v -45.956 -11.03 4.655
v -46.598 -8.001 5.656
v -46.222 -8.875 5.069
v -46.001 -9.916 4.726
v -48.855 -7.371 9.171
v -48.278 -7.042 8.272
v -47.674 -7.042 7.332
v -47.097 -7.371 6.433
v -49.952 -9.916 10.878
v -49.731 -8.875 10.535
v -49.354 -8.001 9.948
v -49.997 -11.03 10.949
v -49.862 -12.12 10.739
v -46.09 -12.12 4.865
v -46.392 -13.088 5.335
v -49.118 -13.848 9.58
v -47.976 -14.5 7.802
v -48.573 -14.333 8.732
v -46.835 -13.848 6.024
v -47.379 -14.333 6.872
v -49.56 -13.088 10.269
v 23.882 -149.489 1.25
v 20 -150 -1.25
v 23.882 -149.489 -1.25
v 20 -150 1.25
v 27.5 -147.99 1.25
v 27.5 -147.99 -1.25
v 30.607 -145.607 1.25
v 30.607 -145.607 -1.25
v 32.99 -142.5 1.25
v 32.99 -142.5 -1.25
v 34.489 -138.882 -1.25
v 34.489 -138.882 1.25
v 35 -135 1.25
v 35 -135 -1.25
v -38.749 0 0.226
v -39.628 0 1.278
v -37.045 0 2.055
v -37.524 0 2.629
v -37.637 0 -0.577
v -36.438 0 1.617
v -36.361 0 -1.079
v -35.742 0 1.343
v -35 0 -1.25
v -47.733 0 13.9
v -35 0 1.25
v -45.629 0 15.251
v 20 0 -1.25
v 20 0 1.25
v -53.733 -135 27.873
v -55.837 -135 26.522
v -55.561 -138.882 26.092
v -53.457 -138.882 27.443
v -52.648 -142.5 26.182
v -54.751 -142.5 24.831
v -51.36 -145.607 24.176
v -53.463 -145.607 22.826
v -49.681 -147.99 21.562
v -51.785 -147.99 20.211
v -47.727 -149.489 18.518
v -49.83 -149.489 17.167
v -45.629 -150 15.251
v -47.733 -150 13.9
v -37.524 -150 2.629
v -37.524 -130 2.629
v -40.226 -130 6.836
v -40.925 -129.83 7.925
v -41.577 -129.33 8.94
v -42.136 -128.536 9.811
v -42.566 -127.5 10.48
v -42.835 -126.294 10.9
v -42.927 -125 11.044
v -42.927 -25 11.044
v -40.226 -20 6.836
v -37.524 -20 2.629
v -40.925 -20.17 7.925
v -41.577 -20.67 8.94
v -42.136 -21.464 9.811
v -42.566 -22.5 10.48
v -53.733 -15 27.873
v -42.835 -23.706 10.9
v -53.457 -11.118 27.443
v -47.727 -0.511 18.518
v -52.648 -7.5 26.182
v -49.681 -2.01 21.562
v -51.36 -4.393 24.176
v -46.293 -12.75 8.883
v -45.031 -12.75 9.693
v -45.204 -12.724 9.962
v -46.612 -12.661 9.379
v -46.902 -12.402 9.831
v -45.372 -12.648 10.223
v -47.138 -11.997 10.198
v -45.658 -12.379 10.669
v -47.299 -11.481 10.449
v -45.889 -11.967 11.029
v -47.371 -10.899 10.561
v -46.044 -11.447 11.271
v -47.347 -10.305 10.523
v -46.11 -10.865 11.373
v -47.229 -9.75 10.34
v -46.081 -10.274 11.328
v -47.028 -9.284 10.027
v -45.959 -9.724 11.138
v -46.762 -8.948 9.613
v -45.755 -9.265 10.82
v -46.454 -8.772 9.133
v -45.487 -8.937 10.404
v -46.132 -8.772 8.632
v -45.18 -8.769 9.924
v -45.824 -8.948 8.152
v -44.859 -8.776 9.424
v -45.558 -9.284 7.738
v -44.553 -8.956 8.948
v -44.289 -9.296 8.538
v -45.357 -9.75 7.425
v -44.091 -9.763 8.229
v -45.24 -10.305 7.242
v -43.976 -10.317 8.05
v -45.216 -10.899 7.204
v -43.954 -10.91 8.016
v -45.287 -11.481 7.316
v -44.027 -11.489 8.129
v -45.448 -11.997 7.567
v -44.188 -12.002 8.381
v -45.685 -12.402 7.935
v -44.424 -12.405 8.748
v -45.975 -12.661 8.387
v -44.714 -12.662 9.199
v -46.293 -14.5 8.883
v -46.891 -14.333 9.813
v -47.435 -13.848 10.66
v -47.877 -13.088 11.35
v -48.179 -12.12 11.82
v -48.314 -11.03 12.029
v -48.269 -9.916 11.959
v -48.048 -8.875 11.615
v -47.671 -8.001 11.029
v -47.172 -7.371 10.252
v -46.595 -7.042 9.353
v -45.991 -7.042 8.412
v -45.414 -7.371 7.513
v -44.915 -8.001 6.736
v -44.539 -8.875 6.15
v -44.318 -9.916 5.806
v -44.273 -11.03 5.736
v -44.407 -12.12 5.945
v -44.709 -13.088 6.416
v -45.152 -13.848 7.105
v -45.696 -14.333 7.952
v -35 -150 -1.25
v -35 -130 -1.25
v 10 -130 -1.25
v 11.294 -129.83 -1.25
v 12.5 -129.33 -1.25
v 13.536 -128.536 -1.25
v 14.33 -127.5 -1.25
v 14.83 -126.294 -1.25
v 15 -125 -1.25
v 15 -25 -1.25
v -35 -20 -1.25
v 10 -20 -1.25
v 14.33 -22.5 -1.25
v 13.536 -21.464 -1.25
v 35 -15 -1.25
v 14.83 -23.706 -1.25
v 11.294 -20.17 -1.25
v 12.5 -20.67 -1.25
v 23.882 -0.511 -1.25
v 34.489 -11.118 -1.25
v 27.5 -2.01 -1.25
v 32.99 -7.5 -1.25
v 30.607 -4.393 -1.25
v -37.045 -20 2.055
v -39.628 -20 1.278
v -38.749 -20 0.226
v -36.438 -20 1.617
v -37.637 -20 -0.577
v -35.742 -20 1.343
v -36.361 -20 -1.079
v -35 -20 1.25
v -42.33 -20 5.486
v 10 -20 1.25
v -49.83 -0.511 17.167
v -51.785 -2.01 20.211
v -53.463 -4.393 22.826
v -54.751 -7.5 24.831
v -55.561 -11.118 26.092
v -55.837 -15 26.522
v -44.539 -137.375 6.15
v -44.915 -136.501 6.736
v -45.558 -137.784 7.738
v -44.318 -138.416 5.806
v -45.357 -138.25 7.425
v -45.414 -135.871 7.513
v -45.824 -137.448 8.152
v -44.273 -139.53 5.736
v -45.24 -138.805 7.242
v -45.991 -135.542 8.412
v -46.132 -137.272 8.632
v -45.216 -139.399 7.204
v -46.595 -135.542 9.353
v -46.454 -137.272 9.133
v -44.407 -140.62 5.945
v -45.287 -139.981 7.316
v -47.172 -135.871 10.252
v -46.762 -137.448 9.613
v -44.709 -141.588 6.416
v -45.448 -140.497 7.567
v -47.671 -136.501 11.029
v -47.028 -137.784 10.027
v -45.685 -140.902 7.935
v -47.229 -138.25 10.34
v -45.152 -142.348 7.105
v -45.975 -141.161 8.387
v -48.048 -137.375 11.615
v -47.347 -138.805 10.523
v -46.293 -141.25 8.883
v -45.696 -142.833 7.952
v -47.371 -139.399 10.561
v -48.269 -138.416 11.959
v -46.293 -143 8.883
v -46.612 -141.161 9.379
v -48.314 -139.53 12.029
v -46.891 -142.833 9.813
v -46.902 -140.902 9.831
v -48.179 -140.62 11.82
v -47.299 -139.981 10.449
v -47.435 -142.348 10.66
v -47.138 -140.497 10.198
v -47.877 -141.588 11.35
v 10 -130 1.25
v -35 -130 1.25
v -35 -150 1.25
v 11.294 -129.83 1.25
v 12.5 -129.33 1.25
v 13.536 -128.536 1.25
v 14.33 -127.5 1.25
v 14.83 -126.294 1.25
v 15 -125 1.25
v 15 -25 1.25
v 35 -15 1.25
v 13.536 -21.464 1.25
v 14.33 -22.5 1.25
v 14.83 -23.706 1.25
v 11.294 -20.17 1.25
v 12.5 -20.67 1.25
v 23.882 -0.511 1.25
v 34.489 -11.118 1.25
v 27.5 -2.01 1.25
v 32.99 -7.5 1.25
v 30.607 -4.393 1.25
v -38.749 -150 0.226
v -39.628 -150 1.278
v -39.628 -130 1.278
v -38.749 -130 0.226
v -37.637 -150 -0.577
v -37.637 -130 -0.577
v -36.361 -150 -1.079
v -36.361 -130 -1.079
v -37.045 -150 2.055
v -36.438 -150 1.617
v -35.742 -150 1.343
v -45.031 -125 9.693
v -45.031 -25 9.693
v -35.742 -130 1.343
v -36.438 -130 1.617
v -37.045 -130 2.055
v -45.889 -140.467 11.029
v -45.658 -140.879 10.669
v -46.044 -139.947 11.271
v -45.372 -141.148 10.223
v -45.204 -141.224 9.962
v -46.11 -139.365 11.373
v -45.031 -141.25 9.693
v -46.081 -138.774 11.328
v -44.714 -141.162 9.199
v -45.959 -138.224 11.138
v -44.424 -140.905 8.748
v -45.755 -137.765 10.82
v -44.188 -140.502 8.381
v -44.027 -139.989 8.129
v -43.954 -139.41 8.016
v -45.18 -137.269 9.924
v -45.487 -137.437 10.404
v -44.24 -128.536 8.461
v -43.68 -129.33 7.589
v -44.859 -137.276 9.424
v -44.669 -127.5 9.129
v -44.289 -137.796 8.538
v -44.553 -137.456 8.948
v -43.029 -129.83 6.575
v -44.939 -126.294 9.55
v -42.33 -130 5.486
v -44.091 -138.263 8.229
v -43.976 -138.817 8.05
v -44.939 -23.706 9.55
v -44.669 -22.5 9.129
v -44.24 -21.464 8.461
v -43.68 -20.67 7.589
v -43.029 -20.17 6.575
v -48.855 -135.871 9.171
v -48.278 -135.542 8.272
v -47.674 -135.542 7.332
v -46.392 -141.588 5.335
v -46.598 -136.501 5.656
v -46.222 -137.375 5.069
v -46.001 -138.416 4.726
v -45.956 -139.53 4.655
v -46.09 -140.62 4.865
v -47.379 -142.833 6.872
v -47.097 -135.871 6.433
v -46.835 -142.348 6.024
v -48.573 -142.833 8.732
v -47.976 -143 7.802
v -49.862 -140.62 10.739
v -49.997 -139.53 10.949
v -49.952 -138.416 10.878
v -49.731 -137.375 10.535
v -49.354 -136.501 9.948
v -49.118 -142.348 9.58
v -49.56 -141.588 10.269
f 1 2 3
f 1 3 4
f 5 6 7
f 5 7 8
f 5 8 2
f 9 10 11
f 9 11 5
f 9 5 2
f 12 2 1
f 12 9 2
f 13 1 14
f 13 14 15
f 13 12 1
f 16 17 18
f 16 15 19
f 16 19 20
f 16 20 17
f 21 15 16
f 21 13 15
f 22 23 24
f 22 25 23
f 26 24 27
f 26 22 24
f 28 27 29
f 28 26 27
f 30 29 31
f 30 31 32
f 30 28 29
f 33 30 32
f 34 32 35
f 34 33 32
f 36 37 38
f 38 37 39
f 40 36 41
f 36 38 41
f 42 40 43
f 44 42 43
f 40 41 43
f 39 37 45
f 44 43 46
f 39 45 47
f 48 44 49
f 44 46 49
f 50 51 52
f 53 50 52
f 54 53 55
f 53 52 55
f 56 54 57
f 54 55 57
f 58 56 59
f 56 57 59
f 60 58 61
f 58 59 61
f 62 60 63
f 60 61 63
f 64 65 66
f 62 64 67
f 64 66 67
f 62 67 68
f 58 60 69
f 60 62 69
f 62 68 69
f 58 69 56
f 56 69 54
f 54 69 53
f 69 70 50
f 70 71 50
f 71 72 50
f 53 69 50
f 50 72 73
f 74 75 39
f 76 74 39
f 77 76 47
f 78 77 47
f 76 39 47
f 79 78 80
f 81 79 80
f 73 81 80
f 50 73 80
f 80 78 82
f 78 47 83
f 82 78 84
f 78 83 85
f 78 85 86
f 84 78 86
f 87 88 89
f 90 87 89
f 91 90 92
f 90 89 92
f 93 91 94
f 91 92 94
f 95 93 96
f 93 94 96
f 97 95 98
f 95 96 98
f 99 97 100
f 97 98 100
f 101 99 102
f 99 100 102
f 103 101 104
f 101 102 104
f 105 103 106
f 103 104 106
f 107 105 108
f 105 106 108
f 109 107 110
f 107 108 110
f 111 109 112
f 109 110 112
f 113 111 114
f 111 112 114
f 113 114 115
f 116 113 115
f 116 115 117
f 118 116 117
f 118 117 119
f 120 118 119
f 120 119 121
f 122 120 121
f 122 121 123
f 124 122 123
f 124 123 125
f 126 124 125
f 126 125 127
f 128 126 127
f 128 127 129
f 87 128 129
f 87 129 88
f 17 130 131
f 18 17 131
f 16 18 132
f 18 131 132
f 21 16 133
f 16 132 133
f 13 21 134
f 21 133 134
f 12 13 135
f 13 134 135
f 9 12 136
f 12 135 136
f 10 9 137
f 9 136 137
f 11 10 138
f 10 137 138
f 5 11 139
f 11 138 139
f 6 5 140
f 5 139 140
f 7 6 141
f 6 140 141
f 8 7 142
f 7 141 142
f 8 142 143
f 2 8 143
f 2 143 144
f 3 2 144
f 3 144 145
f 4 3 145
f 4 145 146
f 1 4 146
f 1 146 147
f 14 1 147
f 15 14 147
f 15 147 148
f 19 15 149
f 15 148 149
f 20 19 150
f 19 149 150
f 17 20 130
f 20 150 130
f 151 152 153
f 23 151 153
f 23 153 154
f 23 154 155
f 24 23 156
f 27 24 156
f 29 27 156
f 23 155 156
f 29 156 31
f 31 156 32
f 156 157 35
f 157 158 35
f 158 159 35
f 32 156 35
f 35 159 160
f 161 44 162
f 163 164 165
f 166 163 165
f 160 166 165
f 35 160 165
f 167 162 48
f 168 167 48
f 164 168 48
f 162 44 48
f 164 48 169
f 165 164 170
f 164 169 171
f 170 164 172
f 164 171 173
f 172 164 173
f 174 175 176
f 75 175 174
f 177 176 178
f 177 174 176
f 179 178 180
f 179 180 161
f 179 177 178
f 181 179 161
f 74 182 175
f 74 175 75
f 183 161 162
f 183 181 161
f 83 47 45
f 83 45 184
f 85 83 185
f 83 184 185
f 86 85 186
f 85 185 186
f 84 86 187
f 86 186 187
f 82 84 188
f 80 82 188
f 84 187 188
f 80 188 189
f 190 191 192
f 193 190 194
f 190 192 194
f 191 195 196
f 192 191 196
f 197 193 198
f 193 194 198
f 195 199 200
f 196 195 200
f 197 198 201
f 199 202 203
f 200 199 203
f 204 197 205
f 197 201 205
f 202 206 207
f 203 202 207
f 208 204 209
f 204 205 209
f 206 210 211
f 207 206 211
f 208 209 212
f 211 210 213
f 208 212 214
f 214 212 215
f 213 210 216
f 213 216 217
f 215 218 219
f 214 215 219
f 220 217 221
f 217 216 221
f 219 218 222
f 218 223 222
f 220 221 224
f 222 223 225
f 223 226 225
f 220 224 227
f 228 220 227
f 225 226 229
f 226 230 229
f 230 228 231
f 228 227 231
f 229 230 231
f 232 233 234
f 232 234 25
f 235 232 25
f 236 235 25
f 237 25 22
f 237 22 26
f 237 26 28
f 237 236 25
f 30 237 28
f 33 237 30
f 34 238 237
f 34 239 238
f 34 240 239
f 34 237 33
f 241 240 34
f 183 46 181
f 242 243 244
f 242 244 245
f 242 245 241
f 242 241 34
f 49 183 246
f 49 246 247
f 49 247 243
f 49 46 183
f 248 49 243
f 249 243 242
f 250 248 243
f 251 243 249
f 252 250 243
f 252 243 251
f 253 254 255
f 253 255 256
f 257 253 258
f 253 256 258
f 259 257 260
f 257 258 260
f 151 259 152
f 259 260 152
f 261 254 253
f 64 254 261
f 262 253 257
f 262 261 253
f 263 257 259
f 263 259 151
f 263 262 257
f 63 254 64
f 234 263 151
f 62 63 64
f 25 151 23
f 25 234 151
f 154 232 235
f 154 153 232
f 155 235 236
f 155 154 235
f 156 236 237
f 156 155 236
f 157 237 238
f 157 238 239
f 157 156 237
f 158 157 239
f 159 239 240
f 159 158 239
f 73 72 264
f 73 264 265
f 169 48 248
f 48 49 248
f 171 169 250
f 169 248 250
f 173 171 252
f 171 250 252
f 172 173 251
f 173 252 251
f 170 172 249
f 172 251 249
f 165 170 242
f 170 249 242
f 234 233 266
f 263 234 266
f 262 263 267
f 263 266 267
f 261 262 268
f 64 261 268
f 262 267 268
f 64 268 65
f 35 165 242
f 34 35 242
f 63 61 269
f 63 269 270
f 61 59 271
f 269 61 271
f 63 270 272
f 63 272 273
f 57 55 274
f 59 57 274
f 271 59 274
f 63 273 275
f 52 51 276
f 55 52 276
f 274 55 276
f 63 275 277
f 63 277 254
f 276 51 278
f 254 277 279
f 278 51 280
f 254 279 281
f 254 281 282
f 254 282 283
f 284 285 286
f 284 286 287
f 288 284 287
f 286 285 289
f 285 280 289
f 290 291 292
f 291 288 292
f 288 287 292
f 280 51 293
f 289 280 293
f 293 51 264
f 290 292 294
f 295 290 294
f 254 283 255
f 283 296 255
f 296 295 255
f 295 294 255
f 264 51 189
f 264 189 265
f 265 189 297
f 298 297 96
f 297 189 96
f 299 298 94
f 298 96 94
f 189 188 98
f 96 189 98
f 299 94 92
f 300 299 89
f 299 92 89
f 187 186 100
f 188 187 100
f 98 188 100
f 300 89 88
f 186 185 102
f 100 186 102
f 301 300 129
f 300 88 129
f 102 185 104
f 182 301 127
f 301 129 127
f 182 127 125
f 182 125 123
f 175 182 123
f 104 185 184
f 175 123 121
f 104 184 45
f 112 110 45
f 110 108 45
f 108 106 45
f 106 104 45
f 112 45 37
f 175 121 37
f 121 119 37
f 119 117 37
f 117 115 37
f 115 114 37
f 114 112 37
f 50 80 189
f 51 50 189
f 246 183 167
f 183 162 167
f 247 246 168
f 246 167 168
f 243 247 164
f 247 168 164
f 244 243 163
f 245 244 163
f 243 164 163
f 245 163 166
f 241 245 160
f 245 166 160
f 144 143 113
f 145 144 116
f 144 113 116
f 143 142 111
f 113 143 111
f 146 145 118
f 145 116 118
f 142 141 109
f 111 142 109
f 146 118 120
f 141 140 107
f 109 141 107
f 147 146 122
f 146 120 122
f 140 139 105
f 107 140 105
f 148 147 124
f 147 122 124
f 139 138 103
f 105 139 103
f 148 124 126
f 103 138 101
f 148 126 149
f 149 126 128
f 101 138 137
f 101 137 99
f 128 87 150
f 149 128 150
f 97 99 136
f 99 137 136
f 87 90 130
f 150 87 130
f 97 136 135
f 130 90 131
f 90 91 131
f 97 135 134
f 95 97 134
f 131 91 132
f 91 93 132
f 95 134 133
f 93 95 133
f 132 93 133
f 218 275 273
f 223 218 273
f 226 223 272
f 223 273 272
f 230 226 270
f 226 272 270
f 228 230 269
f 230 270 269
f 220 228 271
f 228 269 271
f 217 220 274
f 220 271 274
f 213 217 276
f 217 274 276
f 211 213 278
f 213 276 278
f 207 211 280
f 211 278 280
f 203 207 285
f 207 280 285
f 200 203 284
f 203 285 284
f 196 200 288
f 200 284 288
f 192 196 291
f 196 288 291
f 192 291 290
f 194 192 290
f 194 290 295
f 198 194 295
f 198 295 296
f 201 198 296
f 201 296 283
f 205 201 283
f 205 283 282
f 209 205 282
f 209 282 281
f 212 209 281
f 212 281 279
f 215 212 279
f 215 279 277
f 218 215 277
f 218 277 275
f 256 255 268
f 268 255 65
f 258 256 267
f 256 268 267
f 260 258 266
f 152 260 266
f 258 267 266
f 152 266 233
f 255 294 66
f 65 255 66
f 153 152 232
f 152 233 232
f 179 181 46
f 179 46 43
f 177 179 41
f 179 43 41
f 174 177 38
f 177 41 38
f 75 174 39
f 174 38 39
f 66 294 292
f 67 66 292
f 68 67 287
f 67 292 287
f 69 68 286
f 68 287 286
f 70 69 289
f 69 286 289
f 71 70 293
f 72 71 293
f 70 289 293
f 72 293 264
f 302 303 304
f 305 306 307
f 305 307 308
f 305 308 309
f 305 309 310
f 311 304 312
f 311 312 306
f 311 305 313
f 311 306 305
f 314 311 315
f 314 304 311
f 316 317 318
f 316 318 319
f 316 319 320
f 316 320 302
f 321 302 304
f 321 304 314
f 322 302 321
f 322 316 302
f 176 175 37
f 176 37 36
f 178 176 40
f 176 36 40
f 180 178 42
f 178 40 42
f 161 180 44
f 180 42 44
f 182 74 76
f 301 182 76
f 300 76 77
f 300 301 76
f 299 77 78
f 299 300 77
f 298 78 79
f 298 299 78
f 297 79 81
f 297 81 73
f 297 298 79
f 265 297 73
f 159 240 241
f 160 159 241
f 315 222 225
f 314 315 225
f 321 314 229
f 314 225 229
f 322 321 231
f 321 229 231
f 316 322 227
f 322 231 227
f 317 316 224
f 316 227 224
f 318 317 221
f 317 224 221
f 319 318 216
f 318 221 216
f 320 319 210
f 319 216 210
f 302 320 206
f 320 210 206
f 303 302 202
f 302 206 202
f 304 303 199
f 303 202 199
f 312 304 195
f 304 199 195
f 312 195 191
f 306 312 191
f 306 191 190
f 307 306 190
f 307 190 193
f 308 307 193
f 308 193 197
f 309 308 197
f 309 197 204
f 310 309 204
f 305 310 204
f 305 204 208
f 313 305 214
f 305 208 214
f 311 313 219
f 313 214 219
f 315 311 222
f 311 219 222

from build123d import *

# Parameters (mm, degrees)
F0_W      = 70
F0_H      = 2.5
F1_DEPTH  = 150
F2_W      = 52.524413
F2_H      = 110
F3_DEPTH  = 2.501
F4_W      = 110
F4_H      = 30
F5_DEPTH  = 17.506528
F6_DEPTH  = 74.667651
F7_R      = 2
F8_DEPTH  = 1.5
F9_R      = 3.75
F10_R     = 3.75
F11_DEPTH = 2
F12_R     = 15
F13_R     = 15
F14_R     = 5


with BuildPart() as f1:
    # F0 (on Front) → F1 (new body)
    with BuildSketch(Plane.XZ):
        Rectangle(F0_W, F0_H)
        with BuildLine():
            Line((-35, -1.25), (-35, 1.25))
            ThreePointArc((-35, 1.25), (-36.438277, 1.617252), (-37.524413, 2.629093))
            Line((-37.524413, 2.629093), (-39.62809, 1.278337))
            ThreePointArc((-39.62809, 1.278337), (-37.63684, -0.576704), (-35, -1.25))
        make_face()
        Polygon((-39.62809, 1.278337), (-37.524413, 2.629093), (-53.733482, 27.873223), (-55.83716, 26.522467), align=None)
    extrude(amount=F1_DEPTH)

    # F2 (on face) → F3 (cut, through all)
    with BuildSketch(Plane.XY.offset(1.25)):
        with Locations((-11.262206, -75)):
            Rectangle(F2_W, F2_H)
    extrude(amount=-F3_DEPTH, mode=Mode.SUBTRACT)

    # F4 (on face) → F5 (cut, through all)
    with BuildSketch(Plane(origin=(-25.374726, 0, -16.292924), x_dir=(0, 1, 0), z_dir=(0.841471, 0, 0.540302))):
        with Locations((-75, 17.486832)):
            Rectangle(F4_W, F4_H)
    extrude(amount=-F5_DEPTH, mode=Mode.SUBTRACT)

    # F4 (on face) → F6 (cut, through all)
    with BuildSketch(Plane(origin=(-25.374726, 0, -16.292924), x_dir=(0, 1, 0), z_dir=(0.841471, 0, 0.540302))):
        with Locations((-75, 17.486832)):
            Rectangle(F4_W, F4_H)
    extrude(amount=F6_DEPTH, mode=Mode.SUBTRACT)

    # F7 (on face) → F8 (join)
    with BuildSketch(Plane(origin=(-27.478403, 0, -17.64368), x_dir=(0, -1, 0), z_dir=(-0.841471, 0, -0.540302))):
        with Locations((10.75, 32.486832)):
            Circle(F7_R)
        with Locations((139.25, 32.486832)):
            Circle(F7_R)
    extrude(amount=F8_DEPTH)

    # F9 (on face) + F10 (on face) → F11 (join)
    with BuildSketch(Plane(origin=(-28.74061, 0, -18.454133), x_dir=(0, -1, 0), z_dir=(-0.841471, 0, -0.540302))):
        with Locations((10.75, 32.486832)):
            Circle(F9_R)
    with BuildSketch(Plane(origin=(-28.74061, 0, -18.454133), x_dir=(0, -1, 0), z_dir=(-0.841471, 0, -0.540302))):
        with Locations((139.25, 32.486832)):
            Circle(F10_R)
    extrude(amount=F11_DEPTH)

    # F12
    f12_edges = [f1.edges().sort_by_distance(p)[0] for p in [
        (-54.785321, 0, 27.197845),
    ]]
    fillet(f12_edges, radius=F12_R)

    # F13
    f13_edges = [f1.edges().sort_by_distance(p)[0] for p in [
        (-54.785321, -150, 27.197845),
        (35, -150, 0),
        (35, 0, 0),
    ]]
    fillet(f13_edges, radius=F13_R)

    # F14
    f14_edges = [f1.edges().sort_by_distance(p)[0] for p in [
        (-43.979275, -20, 10.368425),
        (15, -20, 0),
        (15, -130, 0),
        (-43.979275, -130, 10.368425),
    ]]
    fillet(f14_edges, radius=F14_R)


solid = f1.part
